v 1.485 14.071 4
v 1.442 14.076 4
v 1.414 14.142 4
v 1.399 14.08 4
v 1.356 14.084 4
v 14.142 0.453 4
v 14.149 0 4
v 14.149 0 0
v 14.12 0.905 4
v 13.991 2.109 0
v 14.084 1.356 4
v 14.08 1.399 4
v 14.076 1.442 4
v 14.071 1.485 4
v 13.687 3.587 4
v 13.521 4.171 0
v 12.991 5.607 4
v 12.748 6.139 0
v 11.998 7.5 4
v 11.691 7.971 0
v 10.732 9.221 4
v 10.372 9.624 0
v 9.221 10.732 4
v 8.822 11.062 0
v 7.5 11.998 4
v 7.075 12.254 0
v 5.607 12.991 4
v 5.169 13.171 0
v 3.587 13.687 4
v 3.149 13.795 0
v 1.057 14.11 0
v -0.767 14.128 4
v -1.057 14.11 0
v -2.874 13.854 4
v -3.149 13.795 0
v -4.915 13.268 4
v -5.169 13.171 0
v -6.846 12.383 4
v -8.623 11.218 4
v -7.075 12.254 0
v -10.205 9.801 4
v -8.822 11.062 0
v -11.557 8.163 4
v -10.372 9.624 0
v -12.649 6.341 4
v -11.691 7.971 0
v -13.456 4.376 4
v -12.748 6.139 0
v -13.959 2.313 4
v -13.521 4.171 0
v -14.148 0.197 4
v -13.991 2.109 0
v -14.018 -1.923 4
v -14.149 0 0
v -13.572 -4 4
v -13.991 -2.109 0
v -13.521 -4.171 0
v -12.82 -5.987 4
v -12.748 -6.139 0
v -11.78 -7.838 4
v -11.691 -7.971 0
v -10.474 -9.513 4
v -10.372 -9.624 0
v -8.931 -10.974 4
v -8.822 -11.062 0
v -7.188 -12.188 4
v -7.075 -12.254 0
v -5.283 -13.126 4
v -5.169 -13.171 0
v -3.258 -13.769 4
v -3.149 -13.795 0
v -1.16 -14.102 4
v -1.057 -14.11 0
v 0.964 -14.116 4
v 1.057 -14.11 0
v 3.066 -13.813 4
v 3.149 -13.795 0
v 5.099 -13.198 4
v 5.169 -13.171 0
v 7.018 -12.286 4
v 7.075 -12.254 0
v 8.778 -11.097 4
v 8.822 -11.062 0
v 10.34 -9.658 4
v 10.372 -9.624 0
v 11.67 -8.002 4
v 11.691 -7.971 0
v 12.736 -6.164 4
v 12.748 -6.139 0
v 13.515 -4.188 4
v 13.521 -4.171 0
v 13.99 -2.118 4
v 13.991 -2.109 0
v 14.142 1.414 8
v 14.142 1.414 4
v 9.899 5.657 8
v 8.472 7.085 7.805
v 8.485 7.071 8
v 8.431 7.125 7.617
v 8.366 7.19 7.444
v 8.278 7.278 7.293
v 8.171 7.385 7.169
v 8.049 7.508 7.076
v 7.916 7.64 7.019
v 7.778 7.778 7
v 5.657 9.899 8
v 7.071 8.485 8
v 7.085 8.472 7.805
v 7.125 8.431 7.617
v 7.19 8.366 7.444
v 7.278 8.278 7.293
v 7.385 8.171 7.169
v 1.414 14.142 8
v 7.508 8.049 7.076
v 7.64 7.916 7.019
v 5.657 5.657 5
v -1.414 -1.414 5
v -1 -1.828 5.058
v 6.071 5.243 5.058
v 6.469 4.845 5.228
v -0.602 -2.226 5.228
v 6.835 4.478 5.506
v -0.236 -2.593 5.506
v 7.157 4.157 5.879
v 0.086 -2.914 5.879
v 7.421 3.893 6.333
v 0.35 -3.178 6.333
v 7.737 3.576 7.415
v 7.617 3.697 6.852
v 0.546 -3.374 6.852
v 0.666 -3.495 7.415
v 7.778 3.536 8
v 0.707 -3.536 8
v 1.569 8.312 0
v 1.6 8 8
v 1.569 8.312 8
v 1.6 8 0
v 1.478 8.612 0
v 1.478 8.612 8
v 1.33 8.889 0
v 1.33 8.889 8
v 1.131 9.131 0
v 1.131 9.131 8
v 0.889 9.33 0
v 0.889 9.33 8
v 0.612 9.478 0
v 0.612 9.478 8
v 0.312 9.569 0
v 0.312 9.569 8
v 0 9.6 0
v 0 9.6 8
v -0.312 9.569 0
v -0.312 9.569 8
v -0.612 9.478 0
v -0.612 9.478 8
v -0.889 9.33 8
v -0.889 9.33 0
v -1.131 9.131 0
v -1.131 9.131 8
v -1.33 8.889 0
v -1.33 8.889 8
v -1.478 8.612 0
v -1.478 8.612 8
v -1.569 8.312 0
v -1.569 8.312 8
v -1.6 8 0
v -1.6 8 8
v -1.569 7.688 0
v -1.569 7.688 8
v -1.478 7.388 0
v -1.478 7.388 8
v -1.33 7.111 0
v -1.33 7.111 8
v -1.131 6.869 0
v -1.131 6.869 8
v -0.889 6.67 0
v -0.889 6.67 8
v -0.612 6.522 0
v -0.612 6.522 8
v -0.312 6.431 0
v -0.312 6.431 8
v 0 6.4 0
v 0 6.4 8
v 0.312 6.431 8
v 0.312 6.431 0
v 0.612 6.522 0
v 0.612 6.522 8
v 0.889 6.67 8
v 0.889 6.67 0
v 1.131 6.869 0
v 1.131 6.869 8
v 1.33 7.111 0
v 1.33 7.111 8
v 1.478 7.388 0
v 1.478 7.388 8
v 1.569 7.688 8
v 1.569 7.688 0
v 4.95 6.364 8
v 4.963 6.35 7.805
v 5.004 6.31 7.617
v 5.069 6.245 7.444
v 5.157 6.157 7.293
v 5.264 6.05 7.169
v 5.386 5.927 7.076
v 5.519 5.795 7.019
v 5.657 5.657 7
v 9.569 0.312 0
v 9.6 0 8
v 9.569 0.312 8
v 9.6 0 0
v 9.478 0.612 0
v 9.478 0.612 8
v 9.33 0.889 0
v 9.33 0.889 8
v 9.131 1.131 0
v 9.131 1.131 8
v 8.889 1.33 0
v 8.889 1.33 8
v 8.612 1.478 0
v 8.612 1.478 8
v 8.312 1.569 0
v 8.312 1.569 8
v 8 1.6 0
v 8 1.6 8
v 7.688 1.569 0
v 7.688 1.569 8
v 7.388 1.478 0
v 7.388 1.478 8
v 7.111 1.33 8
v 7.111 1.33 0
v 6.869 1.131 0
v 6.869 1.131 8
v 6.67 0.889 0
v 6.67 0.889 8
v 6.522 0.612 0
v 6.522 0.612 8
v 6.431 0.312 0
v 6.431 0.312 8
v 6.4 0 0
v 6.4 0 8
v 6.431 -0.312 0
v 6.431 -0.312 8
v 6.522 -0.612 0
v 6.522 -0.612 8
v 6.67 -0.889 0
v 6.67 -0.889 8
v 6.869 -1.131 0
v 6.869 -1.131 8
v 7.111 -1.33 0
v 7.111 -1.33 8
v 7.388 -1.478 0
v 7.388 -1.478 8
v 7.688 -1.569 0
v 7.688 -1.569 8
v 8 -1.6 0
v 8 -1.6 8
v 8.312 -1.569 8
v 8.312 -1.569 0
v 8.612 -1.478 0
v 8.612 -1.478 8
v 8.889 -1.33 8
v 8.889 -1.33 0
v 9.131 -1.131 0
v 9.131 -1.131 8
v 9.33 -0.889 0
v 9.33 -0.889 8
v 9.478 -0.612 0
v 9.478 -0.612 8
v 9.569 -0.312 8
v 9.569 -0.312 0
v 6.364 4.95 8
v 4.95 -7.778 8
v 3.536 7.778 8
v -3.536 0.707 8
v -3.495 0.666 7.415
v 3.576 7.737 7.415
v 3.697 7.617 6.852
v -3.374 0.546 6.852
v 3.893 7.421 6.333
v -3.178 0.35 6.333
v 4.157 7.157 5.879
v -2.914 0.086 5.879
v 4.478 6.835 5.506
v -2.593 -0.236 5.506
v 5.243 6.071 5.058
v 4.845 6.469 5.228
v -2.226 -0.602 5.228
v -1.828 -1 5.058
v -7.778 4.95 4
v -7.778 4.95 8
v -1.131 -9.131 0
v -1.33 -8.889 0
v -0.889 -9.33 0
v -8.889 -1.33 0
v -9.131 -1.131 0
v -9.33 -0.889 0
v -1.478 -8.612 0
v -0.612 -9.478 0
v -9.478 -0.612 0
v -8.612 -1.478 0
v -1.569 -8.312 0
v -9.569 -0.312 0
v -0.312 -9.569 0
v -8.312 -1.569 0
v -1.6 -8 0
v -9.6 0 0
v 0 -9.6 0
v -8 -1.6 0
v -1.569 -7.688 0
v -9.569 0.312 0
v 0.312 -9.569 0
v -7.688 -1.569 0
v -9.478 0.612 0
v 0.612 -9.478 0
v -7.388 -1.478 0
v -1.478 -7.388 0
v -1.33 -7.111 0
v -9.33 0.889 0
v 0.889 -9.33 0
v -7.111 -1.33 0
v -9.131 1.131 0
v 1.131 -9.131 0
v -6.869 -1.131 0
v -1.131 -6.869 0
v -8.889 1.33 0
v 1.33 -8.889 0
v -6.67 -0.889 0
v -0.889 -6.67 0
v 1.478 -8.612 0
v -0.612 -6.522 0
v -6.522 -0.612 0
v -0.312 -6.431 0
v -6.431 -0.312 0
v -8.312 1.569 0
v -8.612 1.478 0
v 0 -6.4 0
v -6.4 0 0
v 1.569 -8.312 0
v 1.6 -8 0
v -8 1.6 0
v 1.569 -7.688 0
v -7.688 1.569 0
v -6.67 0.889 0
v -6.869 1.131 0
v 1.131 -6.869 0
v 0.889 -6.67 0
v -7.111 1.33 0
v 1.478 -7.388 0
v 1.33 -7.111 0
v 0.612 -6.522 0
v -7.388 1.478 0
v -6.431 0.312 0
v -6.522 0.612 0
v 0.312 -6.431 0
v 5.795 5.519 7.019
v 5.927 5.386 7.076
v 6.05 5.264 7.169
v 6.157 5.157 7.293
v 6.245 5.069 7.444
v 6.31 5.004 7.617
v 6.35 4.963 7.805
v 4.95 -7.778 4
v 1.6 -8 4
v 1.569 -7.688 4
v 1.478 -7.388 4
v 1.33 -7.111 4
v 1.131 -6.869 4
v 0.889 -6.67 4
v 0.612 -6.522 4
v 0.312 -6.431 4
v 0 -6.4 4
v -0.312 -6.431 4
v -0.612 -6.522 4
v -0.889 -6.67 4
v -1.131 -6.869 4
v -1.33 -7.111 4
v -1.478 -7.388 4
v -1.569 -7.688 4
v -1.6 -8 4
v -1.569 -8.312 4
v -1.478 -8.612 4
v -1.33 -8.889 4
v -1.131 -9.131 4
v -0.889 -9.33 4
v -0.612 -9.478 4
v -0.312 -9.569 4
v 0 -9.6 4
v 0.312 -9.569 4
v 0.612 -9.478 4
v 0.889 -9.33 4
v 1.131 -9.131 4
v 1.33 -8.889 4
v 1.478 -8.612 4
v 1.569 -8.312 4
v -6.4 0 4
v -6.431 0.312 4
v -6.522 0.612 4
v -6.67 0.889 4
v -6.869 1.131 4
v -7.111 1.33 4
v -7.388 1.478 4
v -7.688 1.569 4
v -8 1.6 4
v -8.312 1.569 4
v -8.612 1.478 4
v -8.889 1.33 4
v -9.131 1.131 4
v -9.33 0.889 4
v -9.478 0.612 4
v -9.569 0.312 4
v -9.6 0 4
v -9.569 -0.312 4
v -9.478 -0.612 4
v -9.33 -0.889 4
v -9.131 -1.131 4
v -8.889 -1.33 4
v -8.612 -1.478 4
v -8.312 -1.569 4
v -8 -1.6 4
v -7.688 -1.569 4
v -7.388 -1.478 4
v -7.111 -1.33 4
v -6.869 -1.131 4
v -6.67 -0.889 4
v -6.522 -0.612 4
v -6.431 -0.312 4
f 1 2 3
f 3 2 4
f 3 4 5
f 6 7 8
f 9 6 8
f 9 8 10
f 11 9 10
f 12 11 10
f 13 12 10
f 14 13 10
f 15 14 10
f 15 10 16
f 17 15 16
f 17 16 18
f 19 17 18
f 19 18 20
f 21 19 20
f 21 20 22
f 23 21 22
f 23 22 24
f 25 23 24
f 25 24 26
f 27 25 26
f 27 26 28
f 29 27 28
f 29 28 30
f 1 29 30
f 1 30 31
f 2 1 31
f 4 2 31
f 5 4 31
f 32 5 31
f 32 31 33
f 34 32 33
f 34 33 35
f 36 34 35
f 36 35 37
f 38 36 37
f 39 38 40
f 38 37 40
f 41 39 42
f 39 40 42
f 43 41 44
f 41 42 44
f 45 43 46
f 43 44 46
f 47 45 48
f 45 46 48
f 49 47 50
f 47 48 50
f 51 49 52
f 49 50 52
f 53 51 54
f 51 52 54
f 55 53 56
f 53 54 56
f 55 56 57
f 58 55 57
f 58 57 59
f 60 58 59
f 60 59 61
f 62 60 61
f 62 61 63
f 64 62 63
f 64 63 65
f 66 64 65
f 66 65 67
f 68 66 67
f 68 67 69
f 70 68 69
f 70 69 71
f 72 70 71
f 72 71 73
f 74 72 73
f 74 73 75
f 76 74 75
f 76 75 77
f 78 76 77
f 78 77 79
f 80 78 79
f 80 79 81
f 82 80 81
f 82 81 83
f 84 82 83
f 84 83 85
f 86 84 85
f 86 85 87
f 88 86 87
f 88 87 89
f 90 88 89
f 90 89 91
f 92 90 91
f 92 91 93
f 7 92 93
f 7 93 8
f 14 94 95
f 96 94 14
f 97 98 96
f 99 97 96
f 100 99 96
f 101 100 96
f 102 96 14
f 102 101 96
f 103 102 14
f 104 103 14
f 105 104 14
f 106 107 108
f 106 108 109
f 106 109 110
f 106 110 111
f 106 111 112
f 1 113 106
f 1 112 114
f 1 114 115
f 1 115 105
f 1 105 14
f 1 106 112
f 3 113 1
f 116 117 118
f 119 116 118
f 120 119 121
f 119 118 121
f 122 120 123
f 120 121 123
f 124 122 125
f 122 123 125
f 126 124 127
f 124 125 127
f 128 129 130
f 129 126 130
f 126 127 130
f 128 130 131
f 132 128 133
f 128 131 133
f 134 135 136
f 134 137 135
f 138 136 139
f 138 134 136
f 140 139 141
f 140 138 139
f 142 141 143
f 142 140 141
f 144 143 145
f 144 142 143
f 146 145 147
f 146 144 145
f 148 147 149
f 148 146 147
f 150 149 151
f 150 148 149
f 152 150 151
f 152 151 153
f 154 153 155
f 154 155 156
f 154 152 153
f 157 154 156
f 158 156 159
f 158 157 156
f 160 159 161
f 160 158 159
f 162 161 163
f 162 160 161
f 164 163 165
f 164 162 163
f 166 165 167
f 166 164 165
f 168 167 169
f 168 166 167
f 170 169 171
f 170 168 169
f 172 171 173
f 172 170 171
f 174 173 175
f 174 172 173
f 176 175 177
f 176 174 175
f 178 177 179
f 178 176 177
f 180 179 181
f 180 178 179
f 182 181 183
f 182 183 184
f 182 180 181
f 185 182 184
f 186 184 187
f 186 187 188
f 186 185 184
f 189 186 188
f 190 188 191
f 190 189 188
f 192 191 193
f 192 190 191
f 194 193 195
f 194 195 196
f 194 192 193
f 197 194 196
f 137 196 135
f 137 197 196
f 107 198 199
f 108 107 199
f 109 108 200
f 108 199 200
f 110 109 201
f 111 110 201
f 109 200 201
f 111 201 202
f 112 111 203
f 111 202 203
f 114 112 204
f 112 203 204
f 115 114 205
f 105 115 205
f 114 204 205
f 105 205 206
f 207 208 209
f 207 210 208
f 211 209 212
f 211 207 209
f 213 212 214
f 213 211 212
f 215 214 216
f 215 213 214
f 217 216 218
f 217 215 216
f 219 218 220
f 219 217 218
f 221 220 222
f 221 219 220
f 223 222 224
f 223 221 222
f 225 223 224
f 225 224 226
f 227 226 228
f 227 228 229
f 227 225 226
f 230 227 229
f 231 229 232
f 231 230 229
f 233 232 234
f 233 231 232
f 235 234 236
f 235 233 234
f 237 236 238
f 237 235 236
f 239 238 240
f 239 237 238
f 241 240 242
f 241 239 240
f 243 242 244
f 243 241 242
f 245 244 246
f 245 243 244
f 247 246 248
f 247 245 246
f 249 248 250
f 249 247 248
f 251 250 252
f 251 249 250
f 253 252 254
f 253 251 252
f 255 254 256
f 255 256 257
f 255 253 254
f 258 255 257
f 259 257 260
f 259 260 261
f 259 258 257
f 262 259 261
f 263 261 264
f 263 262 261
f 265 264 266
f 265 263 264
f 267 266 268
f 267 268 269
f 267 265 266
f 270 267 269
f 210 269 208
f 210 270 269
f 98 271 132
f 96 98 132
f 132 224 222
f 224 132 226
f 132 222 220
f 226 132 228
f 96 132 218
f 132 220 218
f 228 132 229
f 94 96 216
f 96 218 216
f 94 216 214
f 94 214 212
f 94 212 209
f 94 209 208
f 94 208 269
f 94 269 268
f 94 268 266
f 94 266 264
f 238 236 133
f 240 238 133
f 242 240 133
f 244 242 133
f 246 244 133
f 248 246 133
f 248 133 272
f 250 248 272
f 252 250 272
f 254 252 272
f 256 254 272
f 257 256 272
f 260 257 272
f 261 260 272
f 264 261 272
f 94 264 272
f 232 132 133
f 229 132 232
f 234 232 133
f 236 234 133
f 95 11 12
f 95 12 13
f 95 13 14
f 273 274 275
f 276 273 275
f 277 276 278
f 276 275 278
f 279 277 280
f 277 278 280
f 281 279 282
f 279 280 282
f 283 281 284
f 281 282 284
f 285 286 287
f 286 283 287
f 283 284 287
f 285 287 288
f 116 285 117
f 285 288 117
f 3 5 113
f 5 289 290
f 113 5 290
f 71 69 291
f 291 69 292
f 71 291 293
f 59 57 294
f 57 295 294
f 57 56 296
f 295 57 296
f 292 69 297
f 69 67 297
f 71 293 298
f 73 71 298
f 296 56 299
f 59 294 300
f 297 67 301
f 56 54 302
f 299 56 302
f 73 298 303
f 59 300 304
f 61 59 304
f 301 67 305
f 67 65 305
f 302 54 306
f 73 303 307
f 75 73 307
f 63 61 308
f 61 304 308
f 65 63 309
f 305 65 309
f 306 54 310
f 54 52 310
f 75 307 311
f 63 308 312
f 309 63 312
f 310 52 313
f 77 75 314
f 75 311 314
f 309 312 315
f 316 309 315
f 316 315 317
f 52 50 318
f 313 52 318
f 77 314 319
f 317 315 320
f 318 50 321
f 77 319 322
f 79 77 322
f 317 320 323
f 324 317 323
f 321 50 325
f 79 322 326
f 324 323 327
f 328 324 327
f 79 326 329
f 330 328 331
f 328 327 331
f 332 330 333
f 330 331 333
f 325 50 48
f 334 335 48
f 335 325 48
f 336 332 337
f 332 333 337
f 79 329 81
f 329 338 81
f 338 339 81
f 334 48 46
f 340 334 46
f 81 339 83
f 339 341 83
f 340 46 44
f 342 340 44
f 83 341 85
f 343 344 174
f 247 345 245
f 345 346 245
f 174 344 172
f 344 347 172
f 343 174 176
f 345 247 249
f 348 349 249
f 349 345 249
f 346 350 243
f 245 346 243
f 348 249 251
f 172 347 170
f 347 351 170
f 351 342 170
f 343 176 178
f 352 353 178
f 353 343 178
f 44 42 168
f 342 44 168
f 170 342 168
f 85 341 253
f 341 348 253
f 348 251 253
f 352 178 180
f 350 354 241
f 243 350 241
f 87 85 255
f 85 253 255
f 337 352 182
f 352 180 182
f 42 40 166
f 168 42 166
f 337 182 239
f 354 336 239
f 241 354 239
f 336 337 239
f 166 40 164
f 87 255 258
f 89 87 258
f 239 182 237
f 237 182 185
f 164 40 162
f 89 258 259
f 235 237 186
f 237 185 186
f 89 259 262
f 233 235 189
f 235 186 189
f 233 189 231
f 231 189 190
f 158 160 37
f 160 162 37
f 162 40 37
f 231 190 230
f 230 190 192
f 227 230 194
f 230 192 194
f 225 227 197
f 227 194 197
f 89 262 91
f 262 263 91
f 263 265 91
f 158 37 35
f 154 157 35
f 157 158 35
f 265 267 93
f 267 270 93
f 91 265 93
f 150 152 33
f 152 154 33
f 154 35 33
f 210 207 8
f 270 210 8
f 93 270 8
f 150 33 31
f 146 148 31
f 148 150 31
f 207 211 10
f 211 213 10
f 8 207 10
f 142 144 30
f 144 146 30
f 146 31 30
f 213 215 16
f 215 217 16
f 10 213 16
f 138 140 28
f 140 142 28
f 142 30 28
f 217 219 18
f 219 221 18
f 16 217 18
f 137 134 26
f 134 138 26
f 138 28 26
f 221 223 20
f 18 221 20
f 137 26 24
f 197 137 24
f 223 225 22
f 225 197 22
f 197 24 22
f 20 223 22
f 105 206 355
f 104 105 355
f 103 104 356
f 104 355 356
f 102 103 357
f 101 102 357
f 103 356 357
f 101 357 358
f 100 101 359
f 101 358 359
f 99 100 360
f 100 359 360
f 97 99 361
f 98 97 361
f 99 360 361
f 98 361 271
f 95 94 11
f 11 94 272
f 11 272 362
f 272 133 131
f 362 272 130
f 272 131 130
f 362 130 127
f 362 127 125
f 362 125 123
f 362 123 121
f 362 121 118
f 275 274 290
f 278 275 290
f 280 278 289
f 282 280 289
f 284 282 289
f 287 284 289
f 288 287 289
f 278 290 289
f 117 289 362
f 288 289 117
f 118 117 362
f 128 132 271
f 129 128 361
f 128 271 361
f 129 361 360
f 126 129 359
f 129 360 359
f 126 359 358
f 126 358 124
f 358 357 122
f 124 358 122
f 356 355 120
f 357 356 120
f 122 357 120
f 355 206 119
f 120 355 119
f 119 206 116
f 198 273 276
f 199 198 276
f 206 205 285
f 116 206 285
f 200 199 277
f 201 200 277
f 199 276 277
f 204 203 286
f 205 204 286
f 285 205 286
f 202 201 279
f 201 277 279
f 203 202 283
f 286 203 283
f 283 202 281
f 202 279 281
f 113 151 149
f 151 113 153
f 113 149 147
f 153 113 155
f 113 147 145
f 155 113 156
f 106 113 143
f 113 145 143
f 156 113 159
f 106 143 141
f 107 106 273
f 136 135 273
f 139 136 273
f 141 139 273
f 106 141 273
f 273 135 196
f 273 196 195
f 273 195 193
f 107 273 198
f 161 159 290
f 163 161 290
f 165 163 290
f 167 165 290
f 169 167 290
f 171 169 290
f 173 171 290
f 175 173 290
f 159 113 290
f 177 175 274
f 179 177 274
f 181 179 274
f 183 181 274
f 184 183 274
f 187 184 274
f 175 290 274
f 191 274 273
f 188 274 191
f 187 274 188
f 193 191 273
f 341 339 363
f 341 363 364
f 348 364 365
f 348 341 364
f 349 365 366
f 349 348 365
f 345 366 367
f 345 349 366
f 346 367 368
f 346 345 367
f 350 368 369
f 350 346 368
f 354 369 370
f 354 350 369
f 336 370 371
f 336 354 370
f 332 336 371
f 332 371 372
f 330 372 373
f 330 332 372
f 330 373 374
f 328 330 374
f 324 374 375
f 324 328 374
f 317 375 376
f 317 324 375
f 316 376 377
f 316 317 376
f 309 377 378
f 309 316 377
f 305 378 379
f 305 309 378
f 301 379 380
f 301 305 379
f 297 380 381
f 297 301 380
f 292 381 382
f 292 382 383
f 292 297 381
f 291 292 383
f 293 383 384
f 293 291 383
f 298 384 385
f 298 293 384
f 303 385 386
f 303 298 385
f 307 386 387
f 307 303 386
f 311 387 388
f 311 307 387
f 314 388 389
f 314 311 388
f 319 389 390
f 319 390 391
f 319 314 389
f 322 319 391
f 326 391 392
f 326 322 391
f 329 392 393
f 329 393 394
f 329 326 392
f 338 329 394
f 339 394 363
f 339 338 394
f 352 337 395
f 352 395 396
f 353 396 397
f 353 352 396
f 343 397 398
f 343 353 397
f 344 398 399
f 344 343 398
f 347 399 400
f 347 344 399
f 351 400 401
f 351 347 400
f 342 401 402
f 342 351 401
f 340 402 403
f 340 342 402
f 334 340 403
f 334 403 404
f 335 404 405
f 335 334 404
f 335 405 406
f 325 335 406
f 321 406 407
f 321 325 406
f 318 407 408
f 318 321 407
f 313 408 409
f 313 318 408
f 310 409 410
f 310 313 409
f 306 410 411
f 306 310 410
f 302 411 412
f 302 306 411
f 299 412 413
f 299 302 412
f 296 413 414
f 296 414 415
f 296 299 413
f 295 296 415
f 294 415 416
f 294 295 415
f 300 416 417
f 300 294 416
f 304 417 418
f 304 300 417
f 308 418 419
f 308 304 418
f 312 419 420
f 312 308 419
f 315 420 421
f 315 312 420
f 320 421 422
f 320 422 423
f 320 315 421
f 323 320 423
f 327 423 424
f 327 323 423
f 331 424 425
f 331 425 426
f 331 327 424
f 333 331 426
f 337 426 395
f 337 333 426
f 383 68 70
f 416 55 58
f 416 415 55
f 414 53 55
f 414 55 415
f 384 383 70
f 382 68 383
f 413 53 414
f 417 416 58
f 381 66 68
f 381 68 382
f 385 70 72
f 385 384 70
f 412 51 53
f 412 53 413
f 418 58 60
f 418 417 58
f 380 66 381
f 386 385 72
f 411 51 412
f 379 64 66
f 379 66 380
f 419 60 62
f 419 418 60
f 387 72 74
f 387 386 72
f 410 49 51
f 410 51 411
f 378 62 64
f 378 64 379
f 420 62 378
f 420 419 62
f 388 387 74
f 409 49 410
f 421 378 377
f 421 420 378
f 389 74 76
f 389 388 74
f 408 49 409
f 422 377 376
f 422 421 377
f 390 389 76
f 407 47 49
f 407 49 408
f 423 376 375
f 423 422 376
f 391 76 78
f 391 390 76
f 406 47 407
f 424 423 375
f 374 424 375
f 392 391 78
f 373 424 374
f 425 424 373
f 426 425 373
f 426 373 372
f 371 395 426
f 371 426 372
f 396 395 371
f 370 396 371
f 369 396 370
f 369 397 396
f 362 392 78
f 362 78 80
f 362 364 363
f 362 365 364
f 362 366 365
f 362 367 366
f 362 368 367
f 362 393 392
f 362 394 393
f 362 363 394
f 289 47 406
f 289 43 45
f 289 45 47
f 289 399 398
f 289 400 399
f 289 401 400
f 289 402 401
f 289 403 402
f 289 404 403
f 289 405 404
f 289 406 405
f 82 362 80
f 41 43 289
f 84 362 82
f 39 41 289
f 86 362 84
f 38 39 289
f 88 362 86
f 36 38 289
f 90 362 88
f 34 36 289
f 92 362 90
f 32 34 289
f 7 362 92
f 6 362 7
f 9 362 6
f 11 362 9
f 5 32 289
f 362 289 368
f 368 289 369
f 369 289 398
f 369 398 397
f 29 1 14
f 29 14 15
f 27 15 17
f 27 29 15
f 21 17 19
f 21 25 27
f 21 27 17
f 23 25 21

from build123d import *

# Parameters (mm, degrees)
SKETCH_1_R           = 14.149308539
SKETCH_1_R_2         = 1.6
EXTRUDE_1_DEPTH      = 4
EXTRUDE_2_DEPTH      = 11
EXTRUDE_2_DEPTH_BACK = 2
CUT_EXTRUDE_START    = -10
SKETCH_4_R           = 1.6
CUT_EXTRUDE_1_DEPTH  = 10
EXTRUDE_START        = -3
EXTRUDE_3_DEPTH      = 3


with BuildPart() as part:
    # 草图1 → 凸台-拉伸1 (new body)
    with BuildSketch(Plane.XY):
        Circle(SKETCH_1_R)
        with Locations((0, -8)):
            Circle(SKETCH_1_R_2, mode=Mode.SUBTRACT)
        with Locations((8, 0)):
            Circle(SKETCH_1_R_2, mode=Mode.SUBTRACT)
        with Locations((0, 8)):
            Circle(SKETCH_1_R_2, mode=Mode.SUBTRACT)
        with Locations((-8, 0)):
            Circle(SKETCH_1_R_2, mode=Mode.SUBTRACT)
    extrude(amount=EXTRUDE_1_DEPTH)

    # 草图3 → 凸台-拉伸2 (add, two sides: drawn at the far end of the back side and taken through both)
    with BuildSketch(Plane(origin=(0, 0, 0), x_dir=(0, 0, -1), z_dir=(0.7071067811865488, 0.7071067811865464, 0)).offset(-EXTRUDE_2_DEPTH_BACK)):
        with BuildLine():
            Line((-8, 9), (-8, 3))
            ThreePointArc((-8, 3), (-5.878679656, 2.121320344), (-5, 0))
            ThreePointArc((-5, 0), (-5.878679656, -2.121320344), (-8, -3))
            Line((-8, -3), (-8, -9))
            Line((-8, -9), (-4, -9))
            Line((-4, -9), (-4, 9))
            Line((-4, 9), (-8, 9))
        make_face()
    extrude(amount=EXTRUDE_2_DEPTH + EXTRUDE_2_DEPTH_BACK)

    # 草图4 → 切除-拉伸1 (cut)
    with BuildSketch(Plane.XY.offset(8).offset(CUT_EXTRUDE_START)):
        with Locations((8, 0)):
            Circle(SKETCH_4_R)
        with Locations((0, 8)):
            Circle(SKETCH_4_R)
    extrude(amount=CUT_EXTRUDE_1_DEPTH, mode=Mode.SUBTRACT)

    # 草图5 → 凸台-拉伸3 (add)
    with BuildSketch(Plane(origin=(7.778174593, 7.778174593, 0), x_dir=(0, 0, -1), z_dir=(0.7071067811865486, 0.7071067811865465, 0)).offset(EXTRUDE_START)):
        with BuildLine():
            Line((-8, -1), (-8, -3))
            ThreePointArc((-8, -3), (-5.878679656, -2.121320344), (-5, 0))
            ThreePointArc((-5, 0), (-5.878679656, 2.121320344), (-8, 3))
            Line((-8, 3), (-8, 1))
            ThreePointArc((-8, 1), (-7.292893219, 0.707106781), (-7, 0))
            ThreePointArc((-7, 0), (-7.292893219, -0.707106781), (-8, -1))
        make_face()
    extrude(amount=EXTRUDE_3_DEPTH)


solid = part.part
